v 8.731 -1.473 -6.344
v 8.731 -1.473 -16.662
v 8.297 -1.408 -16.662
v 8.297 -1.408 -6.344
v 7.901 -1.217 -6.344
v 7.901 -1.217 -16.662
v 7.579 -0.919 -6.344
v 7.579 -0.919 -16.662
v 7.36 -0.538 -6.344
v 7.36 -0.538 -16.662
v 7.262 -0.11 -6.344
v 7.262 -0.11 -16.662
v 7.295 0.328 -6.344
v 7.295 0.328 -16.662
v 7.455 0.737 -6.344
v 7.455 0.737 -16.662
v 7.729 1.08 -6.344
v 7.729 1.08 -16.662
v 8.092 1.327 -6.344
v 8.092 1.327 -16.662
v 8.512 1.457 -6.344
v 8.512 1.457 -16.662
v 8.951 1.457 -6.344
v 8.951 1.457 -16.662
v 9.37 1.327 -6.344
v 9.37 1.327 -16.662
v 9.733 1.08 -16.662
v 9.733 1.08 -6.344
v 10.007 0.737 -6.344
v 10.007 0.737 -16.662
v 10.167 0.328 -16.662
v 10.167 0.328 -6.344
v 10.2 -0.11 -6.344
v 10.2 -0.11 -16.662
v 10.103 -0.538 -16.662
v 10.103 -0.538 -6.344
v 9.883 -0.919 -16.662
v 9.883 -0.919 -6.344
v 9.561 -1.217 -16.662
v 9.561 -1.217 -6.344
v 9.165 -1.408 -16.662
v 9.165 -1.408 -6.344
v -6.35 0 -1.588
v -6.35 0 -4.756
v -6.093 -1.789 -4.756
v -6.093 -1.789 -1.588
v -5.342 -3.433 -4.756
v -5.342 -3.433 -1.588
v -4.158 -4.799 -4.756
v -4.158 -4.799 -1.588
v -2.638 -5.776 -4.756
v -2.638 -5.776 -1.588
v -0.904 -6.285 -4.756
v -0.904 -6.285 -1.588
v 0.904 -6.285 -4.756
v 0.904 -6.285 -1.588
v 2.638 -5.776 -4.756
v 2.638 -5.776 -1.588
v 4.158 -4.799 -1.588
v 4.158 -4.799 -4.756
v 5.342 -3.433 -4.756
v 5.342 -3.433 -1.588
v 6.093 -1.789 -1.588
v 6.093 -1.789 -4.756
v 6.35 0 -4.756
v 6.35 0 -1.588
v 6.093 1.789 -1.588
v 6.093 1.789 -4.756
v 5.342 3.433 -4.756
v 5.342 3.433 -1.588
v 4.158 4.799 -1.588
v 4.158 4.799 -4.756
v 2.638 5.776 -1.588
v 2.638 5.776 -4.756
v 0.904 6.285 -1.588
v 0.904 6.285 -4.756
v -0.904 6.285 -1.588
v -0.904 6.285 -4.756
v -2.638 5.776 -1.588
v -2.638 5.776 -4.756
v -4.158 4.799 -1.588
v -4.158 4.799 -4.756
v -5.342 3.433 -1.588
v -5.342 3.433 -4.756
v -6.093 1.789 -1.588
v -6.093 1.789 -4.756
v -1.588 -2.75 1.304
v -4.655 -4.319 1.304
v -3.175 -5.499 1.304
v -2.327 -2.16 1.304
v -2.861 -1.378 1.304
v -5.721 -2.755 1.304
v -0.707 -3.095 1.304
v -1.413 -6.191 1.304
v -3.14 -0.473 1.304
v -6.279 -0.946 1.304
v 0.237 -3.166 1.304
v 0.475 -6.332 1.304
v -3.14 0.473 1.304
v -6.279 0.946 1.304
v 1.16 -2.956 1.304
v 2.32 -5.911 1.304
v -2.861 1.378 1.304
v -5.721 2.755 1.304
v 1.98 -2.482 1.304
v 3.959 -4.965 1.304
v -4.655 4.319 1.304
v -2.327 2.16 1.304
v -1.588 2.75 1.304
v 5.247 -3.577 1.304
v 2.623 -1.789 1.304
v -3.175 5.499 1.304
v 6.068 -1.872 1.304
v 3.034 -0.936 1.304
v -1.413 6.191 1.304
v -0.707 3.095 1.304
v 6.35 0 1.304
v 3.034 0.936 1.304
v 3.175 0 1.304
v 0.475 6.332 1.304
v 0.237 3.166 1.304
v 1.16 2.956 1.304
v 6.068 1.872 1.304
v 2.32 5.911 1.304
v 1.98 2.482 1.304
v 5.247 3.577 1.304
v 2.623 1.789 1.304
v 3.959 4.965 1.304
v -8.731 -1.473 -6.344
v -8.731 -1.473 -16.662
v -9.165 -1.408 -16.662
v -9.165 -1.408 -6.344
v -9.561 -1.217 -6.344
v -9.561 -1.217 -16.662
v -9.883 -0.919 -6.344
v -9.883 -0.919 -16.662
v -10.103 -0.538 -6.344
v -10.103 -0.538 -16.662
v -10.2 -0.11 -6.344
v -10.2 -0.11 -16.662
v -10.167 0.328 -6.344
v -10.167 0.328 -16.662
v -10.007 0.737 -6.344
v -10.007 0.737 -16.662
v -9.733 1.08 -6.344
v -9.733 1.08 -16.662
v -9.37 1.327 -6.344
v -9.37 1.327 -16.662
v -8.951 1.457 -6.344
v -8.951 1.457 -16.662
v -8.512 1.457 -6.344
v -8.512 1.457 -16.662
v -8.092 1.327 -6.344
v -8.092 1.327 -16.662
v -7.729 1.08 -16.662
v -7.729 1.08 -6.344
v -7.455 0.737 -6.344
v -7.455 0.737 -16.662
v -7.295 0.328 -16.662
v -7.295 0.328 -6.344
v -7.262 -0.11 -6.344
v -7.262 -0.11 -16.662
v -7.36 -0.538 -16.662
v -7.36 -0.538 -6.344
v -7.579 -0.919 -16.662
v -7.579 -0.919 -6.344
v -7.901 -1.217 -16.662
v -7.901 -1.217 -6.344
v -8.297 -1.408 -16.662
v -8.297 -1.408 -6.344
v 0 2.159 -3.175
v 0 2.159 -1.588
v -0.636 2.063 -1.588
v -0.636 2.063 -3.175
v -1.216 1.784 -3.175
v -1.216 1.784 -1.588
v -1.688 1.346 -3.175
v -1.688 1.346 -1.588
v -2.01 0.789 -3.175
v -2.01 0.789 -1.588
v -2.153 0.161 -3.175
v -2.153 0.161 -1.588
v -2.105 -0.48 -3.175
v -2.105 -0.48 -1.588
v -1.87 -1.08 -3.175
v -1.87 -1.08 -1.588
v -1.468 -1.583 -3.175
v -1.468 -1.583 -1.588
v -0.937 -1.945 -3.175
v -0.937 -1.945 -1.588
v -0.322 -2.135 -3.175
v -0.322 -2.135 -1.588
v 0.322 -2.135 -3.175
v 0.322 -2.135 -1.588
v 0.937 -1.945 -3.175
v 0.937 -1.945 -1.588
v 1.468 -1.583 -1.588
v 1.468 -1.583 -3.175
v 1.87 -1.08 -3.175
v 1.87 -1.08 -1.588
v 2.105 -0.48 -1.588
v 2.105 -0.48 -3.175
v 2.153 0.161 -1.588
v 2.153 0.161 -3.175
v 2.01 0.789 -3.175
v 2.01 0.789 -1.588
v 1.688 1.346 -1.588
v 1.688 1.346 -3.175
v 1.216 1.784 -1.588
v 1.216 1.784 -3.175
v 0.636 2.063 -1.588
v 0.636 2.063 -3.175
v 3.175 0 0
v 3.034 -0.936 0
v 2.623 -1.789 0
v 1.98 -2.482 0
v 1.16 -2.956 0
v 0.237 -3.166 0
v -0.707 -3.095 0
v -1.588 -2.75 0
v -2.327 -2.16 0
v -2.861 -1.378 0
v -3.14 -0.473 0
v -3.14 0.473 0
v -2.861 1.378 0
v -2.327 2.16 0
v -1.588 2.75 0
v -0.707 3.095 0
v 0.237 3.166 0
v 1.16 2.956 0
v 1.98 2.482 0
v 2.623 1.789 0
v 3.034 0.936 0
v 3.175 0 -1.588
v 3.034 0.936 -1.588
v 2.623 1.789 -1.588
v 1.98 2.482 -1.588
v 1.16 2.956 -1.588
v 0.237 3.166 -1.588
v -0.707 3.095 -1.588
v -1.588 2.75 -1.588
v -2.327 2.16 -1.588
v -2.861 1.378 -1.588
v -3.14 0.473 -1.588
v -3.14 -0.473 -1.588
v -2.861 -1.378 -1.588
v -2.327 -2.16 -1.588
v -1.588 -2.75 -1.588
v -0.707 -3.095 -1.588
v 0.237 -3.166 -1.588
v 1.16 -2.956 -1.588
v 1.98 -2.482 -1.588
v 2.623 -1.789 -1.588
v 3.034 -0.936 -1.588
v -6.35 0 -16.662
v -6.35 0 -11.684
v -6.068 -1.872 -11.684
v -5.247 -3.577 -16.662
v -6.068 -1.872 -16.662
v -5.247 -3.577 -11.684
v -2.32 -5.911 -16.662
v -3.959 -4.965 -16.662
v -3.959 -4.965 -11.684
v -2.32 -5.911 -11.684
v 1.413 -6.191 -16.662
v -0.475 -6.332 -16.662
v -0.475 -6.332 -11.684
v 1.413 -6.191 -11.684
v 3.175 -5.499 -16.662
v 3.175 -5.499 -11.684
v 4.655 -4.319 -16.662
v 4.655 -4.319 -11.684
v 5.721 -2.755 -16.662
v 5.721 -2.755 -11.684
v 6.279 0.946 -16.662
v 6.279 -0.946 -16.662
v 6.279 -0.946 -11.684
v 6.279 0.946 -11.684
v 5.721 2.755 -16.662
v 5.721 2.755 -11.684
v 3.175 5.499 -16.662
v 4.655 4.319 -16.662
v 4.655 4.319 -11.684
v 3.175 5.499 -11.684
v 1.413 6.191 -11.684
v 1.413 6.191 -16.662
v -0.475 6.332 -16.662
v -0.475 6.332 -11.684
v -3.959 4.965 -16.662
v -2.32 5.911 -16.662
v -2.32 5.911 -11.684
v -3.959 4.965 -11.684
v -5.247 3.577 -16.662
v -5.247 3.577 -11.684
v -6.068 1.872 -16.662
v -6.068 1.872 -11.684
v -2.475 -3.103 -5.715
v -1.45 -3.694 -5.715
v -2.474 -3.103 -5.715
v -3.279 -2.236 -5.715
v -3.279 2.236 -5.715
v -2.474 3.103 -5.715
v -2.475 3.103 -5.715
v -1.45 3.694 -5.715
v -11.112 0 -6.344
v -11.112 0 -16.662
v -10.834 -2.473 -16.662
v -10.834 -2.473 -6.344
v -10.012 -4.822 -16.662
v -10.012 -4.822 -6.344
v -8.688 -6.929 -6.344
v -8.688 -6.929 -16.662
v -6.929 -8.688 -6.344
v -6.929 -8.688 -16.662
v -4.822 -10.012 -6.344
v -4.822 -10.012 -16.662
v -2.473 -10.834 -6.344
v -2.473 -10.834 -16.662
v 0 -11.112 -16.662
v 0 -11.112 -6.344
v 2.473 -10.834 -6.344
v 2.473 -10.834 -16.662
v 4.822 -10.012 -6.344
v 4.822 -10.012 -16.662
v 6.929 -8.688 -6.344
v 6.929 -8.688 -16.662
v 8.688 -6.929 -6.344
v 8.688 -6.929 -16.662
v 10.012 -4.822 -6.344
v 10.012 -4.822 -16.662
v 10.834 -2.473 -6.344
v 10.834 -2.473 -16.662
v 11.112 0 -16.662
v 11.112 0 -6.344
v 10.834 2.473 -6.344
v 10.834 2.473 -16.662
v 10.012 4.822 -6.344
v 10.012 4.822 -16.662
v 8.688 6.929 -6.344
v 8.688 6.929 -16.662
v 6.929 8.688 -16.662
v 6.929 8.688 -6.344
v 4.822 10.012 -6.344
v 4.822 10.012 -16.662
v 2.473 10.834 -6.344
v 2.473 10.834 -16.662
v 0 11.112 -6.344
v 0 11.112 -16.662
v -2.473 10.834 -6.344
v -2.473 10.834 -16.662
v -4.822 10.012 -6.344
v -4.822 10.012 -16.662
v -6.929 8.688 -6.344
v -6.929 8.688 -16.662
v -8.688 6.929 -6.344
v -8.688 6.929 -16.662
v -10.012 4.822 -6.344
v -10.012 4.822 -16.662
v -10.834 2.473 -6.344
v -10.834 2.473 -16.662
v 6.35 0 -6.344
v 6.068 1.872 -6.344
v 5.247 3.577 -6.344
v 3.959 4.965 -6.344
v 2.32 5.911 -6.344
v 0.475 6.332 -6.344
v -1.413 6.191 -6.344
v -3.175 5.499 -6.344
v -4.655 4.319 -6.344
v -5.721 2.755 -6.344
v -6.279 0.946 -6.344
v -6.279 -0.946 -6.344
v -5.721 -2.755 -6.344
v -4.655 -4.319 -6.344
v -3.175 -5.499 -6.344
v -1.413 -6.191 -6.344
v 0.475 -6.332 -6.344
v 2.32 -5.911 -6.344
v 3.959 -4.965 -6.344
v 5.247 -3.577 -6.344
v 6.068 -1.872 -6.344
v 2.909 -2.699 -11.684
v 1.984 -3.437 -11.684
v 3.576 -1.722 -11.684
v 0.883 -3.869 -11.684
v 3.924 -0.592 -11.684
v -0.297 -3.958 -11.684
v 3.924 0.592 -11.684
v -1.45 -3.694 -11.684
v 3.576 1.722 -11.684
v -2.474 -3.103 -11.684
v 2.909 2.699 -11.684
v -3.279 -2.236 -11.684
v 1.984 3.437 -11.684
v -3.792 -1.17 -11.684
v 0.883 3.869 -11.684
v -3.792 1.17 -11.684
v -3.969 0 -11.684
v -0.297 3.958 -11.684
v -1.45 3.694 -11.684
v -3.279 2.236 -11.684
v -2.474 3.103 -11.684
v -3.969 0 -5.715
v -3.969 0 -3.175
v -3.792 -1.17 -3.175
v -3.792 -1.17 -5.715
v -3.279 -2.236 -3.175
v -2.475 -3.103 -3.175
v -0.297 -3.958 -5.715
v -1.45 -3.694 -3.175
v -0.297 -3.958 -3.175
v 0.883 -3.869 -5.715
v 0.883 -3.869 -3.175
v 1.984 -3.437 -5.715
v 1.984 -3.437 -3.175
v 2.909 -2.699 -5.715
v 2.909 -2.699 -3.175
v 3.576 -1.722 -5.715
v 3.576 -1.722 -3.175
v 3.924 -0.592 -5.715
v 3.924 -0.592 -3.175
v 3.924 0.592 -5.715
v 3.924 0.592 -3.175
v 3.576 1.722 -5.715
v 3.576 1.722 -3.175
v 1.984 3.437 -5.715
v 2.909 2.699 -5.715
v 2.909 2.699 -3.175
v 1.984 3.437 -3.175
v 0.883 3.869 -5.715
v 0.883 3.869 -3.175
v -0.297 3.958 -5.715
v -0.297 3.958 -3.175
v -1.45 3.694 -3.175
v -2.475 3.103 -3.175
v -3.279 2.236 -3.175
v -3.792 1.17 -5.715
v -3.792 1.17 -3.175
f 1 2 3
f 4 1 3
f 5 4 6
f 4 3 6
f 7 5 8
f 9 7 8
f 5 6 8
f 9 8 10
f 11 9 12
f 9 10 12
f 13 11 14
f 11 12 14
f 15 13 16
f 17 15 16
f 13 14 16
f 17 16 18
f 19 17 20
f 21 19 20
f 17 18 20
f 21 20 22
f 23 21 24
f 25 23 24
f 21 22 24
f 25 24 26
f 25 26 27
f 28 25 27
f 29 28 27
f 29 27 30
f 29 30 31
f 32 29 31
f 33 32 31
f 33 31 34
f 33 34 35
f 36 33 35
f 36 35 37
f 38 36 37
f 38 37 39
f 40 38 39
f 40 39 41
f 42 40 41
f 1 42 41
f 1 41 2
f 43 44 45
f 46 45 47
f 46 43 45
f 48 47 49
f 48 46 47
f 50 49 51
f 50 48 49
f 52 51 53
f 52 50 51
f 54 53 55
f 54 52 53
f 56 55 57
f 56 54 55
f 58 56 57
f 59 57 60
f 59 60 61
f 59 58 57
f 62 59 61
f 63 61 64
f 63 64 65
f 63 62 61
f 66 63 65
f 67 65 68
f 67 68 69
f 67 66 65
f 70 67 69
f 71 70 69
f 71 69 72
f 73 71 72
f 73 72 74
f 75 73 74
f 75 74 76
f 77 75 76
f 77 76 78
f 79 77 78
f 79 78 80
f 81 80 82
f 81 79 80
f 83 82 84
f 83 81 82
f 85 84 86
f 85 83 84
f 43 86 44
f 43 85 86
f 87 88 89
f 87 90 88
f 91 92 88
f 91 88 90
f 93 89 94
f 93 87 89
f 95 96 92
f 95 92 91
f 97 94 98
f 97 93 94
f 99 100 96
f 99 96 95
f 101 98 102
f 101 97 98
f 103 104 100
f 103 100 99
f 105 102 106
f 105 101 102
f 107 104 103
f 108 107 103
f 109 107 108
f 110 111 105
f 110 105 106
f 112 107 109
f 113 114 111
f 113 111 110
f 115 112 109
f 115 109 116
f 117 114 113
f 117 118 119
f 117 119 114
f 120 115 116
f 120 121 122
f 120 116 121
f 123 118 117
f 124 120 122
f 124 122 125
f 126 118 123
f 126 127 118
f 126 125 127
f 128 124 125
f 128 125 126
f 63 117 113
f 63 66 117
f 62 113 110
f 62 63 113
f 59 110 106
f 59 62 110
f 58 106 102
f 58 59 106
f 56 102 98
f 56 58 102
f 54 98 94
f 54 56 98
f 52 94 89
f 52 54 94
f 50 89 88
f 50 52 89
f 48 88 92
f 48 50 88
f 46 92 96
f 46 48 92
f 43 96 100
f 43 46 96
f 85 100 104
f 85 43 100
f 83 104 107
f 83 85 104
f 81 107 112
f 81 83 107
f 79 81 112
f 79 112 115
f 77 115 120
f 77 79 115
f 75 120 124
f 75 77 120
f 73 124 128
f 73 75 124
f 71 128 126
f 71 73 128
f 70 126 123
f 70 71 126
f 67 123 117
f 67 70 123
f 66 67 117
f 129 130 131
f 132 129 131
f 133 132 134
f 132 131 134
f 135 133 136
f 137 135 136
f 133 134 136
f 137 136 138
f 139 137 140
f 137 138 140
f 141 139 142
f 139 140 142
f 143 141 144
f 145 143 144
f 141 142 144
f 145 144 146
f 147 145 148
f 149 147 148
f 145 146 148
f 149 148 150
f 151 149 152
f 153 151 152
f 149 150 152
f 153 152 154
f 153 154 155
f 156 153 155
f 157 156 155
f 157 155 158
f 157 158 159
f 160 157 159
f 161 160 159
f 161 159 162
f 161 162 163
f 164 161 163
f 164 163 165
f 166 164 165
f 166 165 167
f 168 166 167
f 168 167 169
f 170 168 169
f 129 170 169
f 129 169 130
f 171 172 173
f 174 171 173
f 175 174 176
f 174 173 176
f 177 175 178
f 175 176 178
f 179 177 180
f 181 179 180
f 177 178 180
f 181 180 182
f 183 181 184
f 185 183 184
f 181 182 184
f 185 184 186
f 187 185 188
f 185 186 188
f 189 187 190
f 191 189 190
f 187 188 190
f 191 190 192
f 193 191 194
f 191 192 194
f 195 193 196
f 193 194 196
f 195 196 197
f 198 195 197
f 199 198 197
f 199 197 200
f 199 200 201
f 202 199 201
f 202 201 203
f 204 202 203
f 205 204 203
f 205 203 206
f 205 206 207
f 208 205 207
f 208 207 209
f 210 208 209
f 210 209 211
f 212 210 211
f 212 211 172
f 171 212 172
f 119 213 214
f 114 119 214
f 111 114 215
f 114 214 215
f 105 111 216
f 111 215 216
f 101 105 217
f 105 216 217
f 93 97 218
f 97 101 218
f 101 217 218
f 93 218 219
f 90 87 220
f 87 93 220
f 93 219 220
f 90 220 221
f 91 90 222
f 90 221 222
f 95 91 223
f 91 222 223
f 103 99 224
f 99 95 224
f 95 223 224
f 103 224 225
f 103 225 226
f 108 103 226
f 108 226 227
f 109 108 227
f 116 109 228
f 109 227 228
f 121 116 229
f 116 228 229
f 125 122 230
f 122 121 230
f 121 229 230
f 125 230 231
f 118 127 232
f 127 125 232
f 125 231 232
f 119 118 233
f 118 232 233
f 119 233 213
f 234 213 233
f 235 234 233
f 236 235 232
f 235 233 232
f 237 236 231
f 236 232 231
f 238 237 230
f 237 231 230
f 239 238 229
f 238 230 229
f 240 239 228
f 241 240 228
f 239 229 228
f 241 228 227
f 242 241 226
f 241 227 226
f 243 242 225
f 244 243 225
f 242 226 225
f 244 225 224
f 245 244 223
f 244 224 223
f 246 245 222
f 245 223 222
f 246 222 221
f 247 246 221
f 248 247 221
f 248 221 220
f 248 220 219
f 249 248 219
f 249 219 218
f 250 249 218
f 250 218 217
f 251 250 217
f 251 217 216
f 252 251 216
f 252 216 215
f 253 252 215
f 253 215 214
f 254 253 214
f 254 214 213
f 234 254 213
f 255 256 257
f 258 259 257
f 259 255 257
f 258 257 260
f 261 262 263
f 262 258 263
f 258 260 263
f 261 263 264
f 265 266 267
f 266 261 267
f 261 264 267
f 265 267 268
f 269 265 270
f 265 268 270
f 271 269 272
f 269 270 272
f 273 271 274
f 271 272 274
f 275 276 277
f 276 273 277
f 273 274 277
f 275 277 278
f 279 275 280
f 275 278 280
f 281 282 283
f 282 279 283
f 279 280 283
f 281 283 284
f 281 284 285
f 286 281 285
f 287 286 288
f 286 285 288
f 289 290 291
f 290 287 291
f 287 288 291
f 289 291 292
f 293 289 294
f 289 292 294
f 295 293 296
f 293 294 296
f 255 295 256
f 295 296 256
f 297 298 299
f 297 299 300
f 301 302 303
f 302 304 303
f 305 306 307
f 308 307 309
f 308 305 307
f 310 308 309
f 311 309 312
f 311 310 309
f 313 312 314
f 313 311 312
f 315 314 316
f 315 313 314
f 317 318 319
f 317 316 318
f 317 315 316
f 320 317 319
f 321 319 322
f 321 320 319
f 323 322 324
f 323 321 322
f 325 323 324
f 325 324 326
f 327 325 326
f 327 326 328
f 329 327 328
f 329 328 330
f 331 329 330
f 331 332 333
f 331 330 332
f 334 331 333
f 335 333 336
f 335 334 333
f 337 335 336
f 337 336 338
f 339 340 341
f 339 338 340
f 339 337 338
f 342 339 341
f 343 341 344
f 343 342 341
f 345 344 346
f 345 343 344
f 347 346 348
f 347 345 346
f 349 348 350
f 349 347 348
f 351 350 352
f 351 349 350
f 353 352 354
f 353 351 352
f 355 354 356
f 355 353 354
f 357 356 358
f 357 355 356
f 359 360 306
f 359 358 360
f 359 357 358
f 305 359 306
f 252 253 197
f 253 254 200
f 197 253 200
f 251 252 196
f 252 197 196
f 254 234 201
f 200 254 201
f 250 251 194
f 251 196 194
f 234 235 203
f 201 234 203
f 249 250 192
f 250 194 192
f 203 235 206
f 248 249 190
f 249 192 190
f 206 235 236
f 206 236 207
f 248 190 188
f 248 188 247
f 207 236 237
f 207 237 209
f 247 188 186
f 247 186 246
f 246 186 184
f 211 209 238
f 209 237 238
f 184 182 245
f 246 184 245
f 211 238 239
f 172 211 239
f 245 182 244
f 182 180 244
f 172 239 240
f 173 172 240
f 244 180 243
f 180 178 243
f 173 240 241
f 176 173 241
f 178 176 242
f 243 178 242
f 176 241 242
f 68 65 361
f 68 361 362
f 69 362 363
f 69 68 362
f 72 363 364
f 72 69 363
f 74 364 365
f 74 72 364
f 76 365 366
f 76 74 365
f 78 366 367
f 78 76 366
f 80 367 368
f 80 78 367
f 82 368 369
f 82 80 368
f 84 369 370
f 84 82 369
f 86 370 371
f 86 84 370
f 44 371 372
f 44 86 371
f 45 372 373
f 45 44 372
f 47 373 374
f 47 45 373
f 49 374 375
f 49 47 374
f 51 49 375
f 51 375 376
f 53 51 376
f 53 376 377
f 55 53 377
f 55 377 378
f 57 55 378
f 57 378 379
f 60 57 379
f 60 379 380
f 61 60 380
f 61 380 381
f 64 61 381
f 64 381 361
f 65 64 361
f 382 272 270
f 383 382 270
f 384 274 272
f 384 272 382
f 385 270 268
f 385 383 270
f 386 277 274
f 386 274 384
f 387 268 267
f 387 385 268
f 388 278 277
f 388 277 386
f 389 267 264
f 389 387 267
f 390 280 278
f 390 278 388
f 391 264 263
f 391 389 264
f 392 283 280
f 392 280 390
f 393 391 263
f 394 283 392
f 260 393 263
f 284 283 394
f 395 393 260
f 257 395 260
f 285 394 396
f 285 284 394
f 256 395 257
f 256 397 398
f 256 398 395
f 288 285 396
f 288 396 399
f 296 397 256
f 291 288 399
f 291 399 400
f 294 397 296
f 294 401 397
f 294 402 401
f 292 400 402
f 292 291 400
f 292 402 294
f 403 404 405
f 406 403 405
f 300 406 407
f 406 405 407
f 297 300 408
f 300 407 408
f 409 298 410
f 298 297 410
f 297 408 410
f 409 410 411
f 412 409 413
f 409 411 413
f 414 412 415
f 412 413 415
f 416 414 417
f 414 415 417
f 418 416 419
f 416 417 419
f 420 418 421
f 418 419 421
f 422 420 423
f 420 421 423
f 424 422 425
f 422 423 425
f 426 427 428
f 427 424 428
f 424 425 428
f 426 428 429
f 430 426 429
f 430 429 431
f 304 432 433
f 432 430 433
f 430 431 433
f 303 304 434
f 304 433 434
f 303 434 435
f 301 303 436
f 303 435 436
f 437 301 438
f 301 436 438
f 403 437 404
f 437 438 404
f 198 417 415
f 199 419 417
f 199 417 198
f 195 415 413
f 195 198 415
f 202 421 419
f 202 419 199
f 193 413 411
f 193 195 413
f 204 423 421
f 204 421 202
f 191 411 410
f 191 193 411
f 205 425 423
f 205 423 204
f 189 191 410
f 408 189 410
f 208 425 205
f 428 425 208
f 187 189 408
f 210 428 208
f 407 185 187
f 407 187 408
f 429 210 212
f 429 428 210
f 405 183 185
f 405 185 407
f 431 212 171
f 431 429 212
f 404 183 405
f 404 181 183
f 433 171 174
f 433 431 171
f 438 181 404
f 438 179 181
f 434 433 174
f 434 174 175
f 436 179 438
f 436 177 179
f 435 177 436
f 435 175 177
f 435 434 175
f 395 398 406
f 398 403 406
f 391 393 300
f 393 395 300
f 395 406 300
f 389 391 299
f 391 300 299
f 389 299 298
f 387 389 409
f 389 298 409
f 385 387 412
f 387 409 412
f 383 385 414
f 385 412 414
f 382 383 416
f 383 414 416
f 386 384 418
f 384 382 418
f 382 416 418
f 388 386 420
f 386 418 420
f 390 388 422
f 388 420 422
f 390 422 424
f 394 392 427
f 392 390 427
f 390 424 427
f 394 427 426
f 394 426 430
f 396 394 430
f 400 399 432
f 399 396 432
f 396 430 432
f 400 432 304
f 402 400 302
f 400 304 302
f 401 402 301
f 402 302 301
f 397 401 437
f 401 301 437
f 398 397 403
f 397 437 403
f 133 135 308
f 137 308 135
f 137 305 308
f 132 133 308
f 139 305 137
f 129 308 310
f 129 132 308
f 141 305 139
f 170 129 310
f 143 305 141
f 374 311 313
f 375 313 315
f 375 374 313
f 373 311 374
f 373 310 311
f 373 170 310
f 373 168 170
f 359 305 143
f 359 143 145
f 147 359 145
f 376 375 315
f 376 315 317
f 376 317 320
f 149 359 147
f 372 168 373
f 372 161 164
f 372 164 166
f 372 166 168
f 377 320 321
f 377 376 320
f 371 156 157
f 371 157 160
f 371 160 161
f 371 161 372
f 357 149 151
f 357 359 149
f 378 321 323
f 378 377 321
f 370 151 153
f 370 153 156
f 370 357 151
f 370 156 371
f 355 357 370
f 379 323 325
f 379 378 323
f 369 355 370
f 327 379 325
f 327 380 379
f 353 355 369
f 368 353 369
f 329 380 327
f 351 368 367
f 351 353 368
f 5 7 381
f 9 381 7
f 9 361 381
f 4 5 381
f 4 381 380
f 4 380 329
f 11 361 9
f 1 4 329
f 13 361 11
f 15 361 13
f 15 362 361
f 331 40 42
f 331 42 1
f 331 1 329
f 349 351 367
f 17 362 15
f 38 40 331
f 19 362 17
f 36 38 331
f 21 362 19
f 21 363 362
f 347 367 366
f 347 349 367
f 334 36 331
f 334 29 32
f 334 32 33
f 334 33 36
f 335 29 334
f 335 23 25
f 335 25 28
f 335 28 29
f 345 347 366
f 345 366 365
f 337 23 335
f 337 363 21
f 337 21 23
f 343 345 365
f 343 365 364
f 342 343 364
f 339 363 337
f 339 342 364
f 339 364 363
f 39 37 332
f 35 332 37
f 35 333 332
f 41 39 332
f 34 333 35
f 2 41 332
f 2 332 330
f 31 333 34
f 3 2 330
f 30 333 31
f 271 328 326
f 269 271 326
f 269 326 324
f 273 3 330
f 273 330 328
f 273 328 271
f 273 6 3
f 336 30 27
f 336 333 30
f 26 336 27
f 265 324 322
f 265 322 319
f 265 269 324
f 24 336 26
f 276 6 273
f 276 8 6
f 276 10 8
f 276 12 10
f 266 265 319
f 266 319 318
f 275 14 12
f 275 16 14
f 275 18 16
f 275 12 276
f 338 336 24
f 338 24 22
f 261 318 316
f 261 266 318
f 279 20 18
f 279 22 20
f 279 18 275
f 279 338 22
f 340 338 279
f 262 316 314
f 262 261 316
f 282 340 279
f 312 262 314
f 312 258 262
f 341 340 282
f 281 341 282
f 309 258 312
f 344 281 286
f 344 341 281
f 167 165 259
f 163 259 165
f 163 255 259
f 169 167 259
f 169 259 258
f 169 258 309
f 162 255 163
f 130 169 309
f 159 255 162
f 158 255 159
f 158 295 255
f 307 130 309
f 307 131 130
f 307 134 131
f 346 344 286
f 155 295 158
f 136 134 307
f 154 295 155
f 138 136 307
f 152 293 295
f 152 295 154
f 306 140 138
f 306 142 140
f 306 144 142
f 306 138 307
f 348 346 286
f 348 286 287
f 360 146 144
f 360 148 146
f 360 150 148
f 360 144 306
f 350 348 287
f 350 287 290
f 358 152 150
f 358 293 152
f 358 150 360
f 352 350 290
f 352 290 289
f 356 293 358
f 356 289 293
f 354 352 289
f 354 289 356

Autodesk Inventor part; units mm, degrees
ref_plane "YZ Plane" through (0, 0, 0) normal (1, 0, 0) x (0, 1, 0)
ref_plane "XZ Plane" through (0, 0, 0) normal (0, 1, 0) x (-1, 0, 0)
ref_plane "XY Plane" through (0, 0, 0) normal (0, 0, 1) x (1, 0, 0)
sketch "Sketch1" plane through (0, 0, 0) normal (0, 0, 1) x (1, 0, 0)
  circle A0 centre (0, 0) radius 4.7625
  circle A1 centre (0, 0) radius 3.175
  dimension "d0" = 6.35
  dimension "d2" = 9.525
extrude "Extrusion1" add sketch "Sketch1" against normal blind 1.5875
sketch "Sketch2" plane through (0, 0, -1.5875) normal (0, 0, -1) x (-1, 0, 0)
  circle A0 centre (0, 0) radius 4.7625 projected
  circle A1 centre (0, 0) radius 6.35
  dimension "d5" = 12.7
extrude "Extrusion2" add sketch "Sketch2" along normal blind 1.5875 contours A0 | A1
sketch "Sketch3" plane through (0, 0, -3.175) normal (0, 0, -1) x (-1, 0, 0)
  circle A0 centre (0, 0) radius 6.35 projected
  circle A1 centre (0, 0) radius 3.9688
  dimension "d9" = 7.9375
extrude "Extrusion3" add sketch "Sketch3" along normal blind 2.54
hole "Hole1" at (0, 0, -3.175) direction (0, 0, 1) diameter 4.318 depth 25.4 tip angle 118 clearance for "Flat Head Machine Screw (82)" size "#8" standard "Ansi Unified Screw Threads"
sketch "Sketch4" plane through (0, 0, -5.715) normal (0, 0, -1) x (-1, 0, 0)
  circle A0 centre (0, 0) radius 3.9687 projected
  circle A1 centre (0, 0) radius 6.35 projected
  circle A2 centre (0, 0) radius 11.1125
  dimension "d21" = 22.225
extrude "Extrusion4" add sketch "Sketch4" along normal blind 5.969 contours A1 | A2
sketch "Sketch5" plane through (0, 0, -11.684) normal (0, 0, -1) x (-1, 0, 0)
  circle A0 centre (0, 0) radius 11.1125 projected
  circle A1 centre (0, 0) radius 6.35
  dimension "d25" = 12.7
extrude "Extrusion5" add sketch "Sketch5" along normal blind 4.9784
sketch "Sketch9" plane through (0, 0, -5.715) normal (0, 0, 1) x (1, 0, 0)
  circle A0 centre (0, 0) radius 11.1125 projected
  circle A1 centre (0, 0) radius 6.35 projected
  line L0 (-8.7312, 0) -> (0, 0) construction
  line L1 (0, 0) -> (8.7312, 0) construction
  circle A2 centre (0, 0) radius 8.7312 construction
  dimension "d53" = 2.3813
  dimension "d54" = 2.3813
hole "Hole4" at (-8.7312, 0, -5.715) at (8.7312, 0, -5.715) direction (0, 0, -1) diameter 2.9464 end through all clearance for "Socket Head Cap Screw" size "#4" standard "Ansi Unified Screw Threads"
sketch "Sketch10" plane through (0, 0, -5.715) normal (0, 0, 1) x (1, 0, 0)
  circle A0 centre (-8.7312, 0) radius 1.4732 projected
  circle A1 centre (8.7312, 0) radius 1.4732 projected
  circle A2 centre (0, 0) radius 11.1125 projected
  circle A3 centre (0, 0) radius 6.35 projected
extrude "Extrusion6" add sketch "Sketch10" along normal blind 0.9588
sketch "Sketch11" plane through (0, 0, -1.5875) normal (0, 0, 1) x (1, 0, 0)
  circle A0 centre (0, 0) radius 6.35 projected
  circle A1 centre (0, 0) radius 3.175 projected
extrude "Extrusion7" add sketch "Sketch11" along normal blind 2.8914
sketch "Sketch12" plane through (0, 0, -4.7561) normal (0, 0, 1) x (1, 0, 0)
  circle A0 centre (0, 0) radius 6.35 projected
  circle A1 centre (8.7312, 0) radius 1.4732 projected
  circle A2 centre (-8.7312, 0) radius 1.4732 projected
  circle A3 centre (0, 0) radius 11.1125 projected
extrude "Extrusion8" cut sketch "Sketch12" against normal blind 1.5875
equation "\"d53\" = d54"
equation "\"BendRadius\" = Thickness"
equation "\"BendReliefWidth\" = Thickness"
equation "\"BendReliefDepth\" = 0.5 * Thickness"
equation "\"CornerReliefSize\" = 4 * Thickness"
equation "\"MinimumRemnant\" = 2 * Thickness"
equation "\"TransitionRadius\" = BendRadius"
equation "\"JacobiRadiusSize\" = Thickness"
equation "\"GapSize\" = Thickness"
equation "\"Thickness\" = 3.048"
properties part number "Pneumatic Connector - Bearing Hold" material "Aluminum 6061"
